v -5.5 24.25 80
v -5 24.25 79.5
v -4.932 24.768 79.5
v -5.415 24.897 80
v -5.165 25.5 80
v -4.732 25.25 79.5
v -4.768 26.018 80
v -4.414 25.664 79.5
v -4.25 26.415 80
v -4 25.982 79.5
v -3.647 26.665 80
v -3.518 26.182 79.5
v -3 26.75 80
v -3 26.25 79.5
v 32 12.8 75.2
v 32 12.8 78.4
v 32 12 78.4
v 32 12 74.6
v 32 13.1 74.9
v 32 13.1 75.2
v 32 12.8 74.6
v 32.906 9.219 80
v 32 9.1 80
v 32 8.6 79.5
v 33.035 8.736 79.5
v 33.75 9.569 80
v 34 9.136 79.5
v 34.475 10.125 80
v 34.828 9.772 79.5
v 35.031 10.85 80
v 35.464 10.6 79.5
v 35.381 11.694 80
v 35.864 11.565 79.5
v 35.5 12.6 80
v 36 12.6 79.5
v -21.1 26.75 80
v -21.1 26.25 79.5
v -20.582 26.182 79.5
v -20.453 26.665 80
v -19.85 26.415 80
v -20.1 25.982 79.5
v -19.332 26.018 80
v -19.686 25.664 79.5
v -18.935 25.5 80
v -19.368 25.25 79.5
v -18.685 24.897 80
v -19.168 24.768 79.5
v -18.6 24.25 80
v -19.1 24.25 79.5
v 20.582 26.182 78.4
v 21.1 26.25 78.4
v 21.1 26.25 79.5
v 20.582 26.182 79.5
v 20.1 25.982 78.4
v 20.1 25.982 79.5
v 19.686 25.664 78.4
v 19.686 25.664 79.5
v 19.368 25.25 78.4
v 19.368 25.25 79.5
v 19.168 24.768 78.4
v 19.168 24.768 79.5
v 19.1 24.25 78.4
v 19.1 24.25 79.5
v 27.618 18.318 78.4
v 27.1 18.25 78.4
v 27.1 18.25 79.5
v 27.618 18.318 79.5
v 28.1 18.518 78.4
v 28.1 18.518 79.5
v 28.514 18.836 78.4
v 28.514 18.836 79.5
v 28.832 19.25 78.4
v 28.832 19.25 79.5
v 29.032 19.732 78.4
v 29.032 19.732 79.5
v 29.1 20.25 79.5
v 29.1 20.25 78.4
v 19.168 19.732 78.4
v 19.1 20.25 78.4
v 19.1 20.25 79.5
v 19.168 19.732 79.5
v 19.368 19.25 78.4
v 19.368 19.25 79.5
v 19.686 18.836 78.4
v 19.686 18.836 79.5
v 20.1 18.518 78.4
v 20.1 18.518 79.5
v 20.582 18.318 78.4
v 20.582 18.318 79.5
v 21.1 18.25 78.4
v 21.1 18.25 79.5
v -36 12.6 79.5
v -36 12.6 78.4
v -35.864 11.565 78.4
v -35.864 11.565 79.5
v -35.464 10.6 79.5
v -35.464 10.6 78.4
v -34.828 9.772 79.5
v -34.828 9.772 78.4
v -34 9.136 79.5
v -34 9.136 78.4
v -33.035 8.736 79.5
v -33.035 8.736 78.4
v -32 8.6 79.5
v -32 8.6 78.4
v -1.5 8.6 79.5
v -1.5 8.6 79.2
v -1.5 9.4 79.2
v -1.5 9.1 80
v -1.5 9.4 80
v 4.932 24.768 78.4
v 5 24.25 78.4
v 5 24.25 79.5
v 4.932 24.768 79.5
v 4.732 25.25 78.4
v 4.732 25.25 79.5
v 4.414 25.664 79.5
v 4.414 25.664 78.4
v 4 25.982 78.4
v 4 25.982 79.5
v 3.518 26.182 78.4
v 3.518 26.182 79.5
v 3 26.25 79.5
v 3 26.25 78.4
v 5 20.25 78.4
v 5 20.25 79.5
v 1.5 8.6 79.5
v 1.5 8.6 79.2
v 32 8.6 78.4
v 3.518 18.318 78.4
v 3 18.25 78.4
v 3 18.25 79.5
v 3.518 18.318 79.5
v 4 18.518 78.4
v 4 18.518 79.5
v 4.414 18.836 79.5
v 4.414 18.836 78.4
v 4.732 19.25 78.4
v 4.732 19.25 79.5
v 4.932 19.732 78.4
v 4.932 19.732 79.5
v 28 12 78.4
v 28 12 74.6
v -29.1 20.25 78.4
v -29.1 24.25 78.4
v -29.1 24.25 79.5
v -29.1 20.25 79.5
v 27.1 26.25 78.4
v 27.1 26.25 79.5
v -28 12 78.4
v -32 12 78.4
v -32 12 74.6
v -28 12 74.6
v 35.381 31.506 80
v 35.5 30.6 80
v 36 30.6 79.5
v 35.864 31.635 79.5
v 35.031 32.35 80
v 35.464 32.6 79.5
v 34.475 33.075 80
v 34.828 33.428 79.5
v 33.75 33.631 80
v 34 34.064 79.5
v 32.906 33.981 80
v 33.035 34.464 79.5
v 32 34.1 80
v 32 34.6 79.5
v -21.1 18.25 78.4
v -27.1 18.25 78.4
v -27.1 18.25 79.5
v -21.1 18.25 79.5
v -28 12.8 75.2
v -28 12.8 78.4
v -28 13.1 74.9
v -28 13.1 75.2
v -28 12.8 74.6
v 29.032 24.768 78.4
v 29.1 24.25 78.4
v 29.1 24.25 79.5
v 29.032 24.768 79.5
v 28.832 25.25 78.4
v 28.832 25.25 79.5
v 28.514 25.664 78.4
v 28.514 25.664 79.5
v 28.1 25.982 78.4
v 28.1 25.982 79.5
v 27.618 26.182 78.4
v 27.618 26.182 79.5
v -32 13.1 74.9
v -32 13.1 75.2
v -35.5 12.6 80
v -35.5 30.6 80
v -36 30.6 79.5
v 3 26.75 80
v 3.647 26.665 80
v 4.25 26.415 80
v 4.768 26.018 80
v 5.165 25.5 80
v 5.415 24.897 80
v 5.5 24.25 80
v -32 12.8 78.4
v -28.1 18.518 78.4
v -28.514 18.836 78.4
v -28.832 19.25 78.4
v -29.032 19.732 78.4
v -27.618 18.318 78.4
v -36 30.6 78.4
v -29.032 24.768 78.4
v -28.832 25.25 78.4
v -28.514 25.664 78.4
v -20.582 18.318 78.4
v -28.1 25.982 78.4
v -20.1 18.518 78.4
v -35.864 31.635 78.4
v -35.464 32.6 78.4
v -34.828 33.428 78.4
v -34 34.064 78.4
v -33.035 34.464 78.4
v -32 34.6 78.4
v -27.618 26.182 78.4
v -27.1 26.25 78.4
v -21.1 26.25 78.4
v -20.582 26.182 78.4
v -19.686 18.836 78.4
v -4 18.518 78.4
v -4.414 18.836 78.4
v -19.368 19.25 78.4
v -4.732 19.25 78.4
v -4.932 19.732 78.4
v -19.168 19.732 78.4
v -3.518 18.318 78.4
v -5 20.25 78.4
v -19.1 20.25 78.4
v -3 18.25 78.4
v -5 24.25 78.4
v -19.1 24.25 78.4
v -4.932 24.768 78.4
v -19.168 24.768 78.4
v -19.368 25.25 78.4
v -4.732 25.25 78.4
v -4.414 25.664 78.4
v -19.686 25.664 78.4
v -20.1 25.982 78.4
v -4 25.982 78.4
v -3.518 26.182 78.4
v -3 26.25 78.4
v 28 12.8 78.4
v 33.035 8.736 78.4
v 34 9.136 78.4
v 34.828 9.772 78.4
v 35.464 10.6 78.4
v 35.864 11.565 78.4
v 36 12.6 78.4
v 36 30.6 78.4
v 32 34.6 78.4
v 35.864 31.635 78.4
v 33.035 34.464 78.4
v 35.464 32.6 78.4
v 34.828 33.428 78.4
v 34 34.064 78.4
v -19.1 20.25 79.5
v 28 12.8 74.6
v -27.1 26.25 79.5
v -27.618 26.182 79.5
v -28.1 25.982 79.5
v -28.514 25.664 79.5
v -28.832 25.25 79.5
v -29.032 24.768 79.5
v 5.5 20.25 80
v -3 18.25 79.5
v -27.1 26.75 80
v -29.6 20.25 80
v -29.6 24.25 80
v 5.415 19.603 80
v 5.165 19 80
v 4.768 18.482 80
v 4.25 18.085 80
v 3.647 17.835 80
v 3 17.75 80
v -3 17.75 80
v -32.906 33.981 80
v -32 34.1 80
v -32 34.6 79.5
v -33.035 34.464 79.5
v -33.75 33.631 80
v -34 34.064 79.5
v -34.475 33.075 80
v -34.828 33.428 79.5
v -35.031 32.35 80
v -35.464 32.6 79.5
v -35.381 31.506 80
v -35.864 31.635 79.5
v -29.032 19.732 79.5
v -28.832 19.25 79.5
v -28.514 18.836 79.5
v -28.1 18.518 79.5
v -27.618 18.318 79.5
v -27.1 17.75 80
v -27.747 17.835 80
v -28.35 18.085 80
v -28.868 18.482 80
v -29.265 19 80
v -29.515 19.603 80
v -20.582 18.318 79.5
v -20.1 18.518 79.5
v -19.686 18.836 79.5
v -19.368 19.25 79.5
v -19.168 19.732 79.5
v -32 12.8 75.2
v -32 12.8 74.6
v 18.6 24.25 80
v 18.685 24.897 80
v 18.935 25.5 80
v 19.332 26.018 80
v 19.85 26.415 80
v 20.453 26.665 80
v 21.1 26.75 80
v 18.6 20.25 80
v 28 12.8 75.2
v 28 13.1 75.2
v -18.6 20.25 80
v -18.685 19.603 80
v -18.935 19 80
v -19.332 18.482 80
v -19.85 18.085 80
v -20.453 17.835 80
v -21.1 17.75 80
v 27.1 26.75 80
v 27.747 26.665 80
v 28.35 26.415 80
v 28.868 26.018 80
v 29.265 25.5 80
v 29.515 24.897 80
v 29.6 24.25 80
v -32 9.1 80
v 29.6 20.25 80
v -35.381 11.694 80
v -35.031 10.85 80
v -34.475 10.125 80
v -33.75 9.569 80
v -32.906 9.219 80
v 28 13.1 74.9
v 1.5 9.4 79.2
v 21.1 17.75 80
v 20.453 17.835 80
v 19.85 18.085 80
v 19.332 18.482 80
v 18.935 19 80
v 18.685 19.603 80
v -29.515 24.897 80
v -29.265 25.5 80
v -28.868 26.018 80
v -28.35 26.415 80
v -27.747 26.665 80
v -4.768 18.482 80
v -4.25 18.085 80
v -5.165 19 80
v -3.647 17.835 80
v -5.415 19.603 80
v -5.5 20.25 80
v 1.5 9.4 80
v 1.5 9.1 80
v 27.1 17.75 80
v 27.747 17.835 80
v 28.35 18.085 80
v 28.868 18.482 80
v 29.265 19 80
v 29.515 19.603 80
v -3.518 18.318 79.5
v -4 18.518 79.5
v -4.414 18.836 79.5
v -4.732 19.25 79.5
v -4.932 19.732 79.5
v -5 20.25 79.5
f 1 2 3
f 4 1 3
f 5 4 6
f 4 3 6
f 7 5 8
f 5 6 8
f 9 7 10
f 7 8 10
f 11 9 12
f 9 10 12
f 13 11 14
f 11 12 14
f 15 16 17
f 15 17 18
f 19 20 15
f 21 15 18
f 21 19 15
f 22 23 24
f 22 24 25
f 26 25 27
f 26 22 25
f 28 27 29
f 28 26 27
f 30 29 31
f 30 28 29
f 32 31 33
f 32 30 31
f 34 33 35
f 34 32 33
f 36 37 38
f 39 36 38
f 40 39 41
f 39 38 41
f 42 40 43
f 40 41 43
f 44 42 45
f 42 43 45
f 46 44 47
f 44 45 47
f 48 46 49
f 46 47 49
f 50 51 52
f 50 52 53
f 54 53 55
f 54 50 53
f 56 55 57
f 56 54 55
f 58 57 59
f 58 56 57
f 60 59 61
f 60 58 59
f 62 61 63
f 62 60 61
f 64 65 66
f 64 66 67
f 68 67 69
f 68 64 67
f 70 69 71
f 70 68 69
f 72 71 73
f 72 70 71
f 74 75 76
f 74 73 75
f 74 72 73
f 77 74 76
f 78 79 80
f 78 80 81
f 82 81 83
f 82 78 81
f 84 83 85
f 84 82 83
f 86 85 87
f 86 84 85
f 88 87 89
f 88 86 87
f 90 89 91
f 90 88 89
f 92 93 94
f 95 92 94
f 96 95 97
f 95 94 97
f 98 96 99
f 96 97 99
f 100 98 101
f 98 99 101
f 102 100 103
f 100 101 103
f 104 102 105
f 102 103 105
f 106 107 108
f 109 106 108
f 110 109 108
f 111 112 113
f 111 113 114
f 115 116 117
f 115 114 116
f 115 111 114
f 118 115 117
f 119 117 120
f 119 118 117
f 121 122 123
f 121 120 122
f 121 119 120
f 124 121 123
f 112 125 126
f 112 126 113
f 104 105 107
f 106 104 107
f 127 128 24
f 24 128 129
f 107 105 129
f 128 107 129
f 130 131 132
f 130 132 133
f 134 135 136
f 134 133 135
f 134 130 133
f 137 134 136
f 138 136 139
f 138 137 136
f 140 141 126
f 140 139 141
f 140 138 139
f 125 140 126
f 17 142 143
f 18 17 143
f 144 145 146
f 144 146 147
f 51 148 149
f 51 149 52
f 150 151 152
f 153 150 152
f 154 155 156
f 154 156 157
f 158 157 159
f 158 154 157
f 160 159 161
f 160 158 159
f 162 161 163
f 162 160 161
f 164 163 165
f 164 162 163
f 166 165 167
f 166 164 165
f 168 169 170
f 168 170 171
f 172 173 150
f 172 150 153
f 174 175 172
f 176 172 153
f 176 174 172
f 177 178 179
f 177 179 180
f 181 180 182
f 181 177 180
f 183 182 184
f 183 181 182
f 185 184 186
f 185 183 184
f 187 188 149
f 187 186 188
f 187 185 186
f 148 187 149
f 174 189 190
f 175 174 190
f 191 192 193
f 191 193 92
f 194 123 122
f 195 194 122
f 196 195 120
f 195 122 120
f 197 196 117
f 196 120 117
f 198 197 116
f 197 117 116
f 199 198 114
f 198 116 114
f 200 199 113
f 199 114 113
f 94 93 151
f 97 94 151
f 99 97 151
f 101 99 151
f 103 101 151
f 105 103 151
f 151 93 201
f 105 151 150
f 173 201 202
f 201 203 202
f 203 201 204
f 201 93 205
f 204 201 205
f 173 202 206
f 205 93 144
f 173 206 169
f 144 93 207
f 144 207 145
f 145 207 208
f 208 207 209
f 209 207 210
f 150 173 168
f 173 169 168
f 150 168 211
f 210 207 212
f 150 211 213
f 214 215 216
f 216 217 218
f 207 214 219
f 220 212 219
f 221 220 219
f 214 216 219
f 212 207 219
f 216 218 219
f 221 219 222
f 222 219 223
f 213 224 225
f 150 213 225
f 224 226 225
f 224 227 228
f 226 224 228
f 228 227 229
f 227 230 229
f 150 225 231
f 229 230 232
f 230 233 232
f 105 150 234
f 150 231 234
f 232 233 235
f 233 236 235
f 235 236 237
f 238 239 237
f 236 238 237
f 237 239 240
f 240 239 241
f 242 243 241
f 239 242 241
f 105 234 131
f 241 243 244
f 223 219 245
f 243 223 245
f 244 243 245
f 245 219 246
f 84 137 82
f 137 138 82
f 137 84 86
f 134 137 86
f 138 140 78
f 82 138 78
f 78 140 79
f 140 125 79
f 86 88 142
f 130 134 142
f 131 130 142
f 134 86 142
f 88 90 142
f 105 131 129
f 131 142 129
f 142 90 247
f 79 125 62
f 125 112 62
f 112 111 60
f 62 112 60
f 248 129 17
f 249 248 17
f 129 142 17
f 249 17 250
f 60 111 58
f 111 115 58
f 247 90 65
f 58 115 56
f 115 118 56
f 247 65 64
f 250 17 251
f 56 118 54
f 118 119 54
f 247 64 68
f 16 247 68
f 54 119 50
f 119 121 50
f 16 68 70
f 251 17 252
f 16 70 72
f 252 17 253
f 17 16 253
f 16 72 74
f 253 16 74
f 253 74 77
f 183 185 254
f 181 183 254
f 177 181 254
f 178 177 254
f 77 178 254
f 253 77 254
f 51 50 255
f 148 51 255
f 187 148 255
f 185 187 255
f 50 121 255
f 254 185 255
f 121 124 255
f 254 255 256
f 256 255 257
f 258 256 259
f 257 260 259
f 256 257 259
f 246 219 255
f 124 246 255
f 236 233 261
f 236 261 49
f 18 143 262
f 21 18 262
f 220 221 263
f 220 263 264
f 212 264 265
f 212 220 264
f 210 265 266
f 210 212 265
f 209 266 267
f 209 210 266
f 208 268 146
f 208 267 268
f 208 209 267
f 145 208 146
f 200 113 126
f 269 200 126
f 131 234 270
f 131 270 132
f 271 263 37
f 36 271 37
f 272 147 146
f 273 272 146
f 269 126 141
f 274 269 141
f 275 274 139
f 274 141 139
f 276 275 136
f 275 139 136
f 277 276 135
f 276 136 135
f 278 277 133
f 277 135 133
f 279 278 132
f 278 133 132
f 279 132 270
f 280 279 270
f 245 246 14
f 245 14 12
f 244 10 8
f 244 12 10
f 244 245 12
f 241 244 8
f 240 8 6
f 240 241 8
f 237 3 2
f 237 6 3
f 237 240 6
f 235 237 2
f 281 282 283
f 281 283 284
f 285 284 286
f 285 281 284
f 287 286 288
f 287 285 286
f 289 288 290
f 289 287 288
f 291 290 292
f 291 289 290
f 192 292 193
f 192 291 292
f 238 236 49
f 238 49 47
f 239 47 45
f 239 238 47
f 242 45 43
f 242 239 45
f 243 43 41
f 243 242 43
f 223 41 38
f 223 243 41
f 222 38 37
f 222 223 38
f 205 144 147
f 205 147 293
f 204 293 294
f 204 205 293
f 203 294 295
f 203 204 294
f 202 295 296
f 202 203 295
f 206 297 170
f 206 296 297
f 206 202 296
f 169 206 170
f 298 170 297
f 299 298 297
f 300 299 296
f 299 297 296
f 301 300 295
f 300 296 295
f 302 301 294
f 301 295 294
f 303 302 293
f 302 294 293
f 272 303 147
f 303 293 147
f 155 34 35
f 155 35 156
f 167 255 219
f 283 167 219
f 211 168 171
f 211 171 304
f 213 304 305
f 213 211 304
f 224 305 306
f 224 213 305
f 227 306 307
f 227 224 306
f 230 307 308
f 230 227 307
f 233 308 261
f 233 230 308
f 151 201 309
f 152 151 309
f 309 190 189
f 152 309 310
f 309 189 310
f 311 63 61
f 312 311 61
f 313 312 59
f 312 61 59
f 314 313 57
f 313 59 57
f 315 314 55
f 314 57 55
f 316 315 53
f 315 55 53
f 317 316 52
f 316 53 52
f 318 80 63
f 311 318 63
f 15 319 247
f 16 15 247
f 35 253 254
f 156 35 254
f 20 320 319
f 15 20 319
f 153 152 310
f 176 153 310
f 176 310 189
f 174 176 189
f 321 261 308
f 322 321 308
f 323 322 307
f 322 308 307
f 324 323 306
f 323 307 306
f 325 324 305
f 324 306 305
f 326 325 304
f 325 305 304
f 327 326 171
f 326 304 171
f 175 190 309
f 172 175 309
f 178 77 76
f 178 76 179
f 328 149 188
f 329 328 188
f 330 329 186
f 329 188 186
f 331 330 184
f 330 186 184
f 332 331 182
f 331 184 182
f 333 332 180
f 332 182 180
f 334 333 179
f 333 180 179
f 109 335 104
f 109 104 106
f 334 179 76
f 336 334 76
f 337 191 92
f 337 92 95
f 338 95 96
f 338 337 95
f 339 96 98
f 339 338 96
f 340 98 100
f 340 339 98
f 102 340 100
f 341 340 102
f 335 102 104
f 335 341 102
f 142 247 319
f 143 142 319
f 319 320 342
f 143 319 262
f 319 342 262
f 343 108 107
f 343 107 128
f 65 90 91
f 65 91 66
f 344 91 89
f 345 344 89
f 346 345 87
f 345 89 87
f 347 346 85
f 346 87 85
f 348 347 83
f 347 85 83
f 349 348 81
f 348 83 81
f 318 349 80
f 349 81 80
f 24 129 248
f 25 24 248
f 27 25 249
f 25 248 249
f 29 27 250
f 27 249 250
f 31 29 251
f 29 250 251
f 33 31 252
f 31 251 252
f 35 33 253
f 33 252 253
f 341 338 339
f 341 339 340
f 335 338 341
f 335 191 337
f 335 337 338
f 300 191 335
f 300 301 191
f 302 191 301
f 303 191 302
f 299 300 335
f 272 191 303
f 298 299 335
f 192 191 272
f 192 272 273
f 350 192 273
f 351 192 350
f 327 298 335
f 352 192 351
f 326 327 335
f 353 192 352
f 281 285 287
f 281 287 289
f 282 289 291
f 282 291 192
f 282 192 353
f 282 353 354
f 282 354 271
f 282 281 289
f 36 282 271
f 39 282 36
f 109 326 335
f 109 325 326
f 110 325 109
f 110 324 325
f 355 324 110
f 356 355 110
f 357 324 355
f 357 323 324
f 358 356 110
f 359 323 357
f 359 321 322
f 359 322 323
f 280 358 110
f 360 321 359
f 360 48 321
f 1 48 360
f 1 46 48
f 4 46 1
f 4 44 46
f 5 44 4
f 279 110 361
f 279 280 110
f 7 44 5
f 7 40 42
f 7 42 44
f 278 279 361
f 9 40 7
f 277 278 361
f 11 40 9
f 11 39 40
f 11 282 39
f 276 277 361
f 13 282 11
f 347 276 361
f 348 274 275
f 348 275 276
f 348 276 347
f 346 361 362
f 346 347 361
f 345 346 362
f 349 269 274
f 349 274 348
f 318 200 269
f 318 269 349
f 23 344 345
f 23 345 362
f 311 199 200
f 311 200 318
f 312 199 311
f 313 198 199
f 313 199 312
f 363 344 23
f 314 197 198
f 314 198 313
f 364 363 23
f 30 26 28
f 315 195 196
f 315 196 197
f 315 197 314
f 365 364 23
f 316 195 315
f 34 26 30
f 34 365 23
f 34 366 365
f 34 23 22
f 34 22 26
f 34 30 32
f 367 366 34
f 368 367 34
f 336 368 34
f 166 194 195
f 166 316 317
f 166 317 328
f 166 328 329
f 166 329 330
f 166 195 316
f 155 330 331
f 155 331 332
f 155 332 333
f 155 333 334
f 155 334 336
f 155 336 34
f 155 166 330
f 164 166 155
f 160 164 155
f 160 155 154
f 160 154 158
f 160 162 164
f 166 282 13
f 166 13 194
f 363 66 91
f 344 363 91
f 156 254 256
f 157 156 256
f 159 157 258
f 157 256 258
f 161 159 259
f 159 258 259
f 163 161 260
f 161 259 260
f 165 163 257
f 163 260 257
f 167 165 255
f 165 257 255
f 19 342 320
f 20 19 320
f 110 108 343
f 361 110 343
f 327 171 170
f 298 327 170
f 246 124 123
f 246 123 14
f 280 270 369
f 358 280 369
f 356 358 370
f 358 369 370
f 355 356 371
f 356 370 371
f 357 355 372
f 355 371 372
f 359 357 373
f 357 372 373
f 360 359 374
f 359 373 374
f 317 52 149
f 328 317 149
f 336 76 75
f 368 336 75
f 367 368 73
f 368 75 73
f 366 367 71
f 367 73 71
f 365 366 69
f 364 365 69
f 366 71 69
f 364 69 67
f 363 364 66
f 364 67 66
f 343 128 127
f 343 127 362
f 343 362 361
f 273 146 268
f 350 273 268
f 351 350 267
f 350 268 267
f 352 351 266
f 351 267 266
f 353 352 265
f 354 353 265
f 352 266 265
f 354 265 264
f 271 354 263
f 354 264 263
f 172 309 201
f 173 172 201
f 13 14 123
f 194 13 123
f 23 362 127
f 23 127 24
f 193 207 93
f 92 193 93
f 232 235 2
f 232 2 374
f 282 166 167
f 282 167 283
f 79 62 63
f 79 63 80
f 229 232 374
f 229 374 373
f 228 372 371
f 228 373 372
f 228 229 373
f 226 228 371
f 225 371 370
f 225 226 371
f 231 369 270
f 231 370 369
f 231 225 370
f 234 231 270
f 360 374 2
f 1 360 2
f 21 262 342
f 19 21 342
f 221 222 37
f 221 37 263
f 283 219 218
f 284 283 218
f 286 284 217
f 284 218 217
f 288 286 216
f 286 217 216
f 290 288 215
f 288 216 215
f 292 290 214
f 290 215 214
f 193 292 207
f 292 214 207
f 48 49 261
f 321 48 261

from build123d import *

# Parameters (mm, degrees)
BOSS_EXTRUDE1_START = 78.4
BOSS_EXTRUDE1_DEPTH = 1.6
CHAMFER1_SIZE       = 0.5
BOSS_EXTRUDE2_START = 78
BOSS_EXTRUDE2_DEPTH = 3
CHAMFER2_SIZE       = 0.5
BOSS_EXTRUDE3_START = 78
BOSS_EXTRUDE3_DEPTH = 3
CHAMFER3_SIZE       = 0.5
BOSS_EXTRUDE4_START = 78
BOSS_EXTRUDE4_DEPTH = 3
CHAMFER4_SIZE       = 0.5
BOSS_EXTRUDE5_START = 79.2
SKETCH5_W           = 3
SKETCH5_H           = 0.9
BOSS_EXTRUDE5_DEPTH = 0.9
BOSS_EXTRUDE6_START = -32
BOSS_EXTRUDE6_DEPTH = 4
BOSS_EXTRUDE7_START = 28
BOSS_EXTRUDE7_DEPTH = 4


with BuildPart() as part:
    # Sketch1 → Boss-Extrude1 (new body)
    with BuildSketch(Plane.XY.offset(BOSS_EXTRUDE1_START)):
        with BuildLine():
            Line((-32, 8.6), (32, 8.6))
            ThreePointArc((32, 8.6), (34.828427125, 9.771572875), (36, 12.6))
            Line((36, 12.6), (36, 30.6))
            ThreePointArc((36, 30.6), (34.828427125, 33.428427125), (32, 34.6))
            Line((32, 34.6), (-32, 34.6))
            ThreePointArc((-32, 34.6), (-34.828427125, 33.428427125), (-36, 30.6))
            Line((-36, 30.6), (-36, 12.6))
            ThreePointArc((-36, 12.6), (-34.828427125, 9.771572875), (-32, 8.6))
        make_face()
    extrude(amount=BOSS_EXTRUDE1_DEPTH)

    # Chamfer1
    chamfer1_edges = [part.edges().sort_by_distance(p)[0] for p in [
        (34.828427125, 9.771572875, 80),
        (36, 21.6, 80),
        (34.828427125, 33.428427125, 80),
        (0, 34.6, 80),
        (-34.828427125, 33.428427125, 80),
        (-36, 21.6, 80),
        (-34.828427125, 9.771572875, 80),
        (0, 8.6, 80),
    ]]
    chamfer(chamfer1_edges, length=CHAMFER1_SIZE)


with BuildPart() as body_2:
    # Sketch2 → Boss-Extrude2 (new body)
    with BuildSketch(Plane.XY.offset(BOSS_EXTRUDE2_START)):
        with BuildLine():
            Line((-3, 18.25), (3, 18.25))
            ThreePointArc((3, 18.25), (4.414213562, 18.835786438), (5, 20.25))
            Line((5, 20.25), (5, 24.25))
            ThreePointArc((5, 24.25), (4.414213562, 25.664213562), (3, 26.25))
            Line((3, 26.25), (-3, 26.25))
            ThreePointArc((-3, 26.25), (-4.414213562, 25.664213562), (-5, 24.25))
            Line((-5, 24.25), (-5, 20.25))
            ThreePointArc((-5, 20.25), (-4.414213562, 18.835786438), (-3, 18.25))
        make_face()
    extrude(amount=BOSS_EXTRUDE2_DEPTH)


with BuildPart() as part_1:
    add(part.part)

    # Combine1: cut body 2
    add(body_2.part, mode=Mode.SUBTRACT)

    # Chamfer2
    chamfer2_edges = [part_1.edges().sort_by_distance(p)[0] for p in [
        (-4.414213562, 18.835786438, 80),
        (0, 18.25, 80),
        (4.414213562, 18.835786438, 80),
        (5, 22.25, 80),
        (4.414213562, 25.664213562, 80),
        (0, 26.25, 80),
        (-4.414213562, 25.664213562, 80),
        (-5, 22.25, 80),
    ]]
    chamfer(chamfer2_edges, length=CHAMFER2_SIZE)


with BuildPart() as body_2_2:
    # Sketch3 → Boss-Extrude3 (new body)
    with BuildSketch(Plane.XY.offset(BOSS_EXTRUDE3_START)):
        with BuildLine():
            Line((21.1, 18.25), (27.1, 18.25))
            ThreePointArc((27.1, 18.25), (28.514213562, 18.835786438), (29.1, 20.25))
            Line((29.1, 20.25), (29.1, 24.25))
            ThreePointArc((29.1, 24.25), (28.514213562, 25.664213562), (27.1, 26.25))
            Line((27.1, 26.25), (21.1, 26.25))
            ThreePointArc((21.1, 26.25), (19.685786438, 25.664213562), (19.1, 24.25))
            Line((19.1, 24.25), (19.1, 20.25))
            ThreePointArc((19.1, 20.25), (19.685786438, 18.835786438), (21.1, 18.25))
        make_face()
    extrude(amount=BOSS_EXTRUDE3_DEPTH)


with BuildPart() as part_2:
    add(part_1.part)

    # Combine2: cut body 2 2
    add(body_2_2.part, mode=Mode.SUBTRACT)

    # Chamfer3
    chamfer3_edges = [part_2.edges().sort_by_distance(p)[0] for p in [
        (19.685786438, 18.835786438, 80),
        (24.1, 18.25, 80),
        (28.514213562, 18.835786438, 80),
        (29.1, 22.25, 80),
        (28.514213562, 25.664213562, 80),
        (24.1, 26.25, 80),
        (19.685786438, 25.664213562, 80),
        (19.1, 22.25, 80),
    ]]
    chamfer(chamfer3_edges, length=CHAMFER3_SIZE)


with BuildPart() as body_2_3:
    # Sketch4 → Boss-Extrude4 (new body)
    with BuildSketch(Plane.XY.offset(BOSS_EXTRUDE4_START)):
        with BuildLine():
            Line((-27.1, 18.25), (-21.1, 18.25))
            ThreePointArc((-21.1, 18.25), (-19.685786438, 18.835786438), (-19.1, 20.25))
            Line((-19.1, 20.25), (-19.1, 24.25))
            ThreePointArc((-19.1, 24.25), (-19.685786438, 25.664213562), (-21.1, 26.25))
            Line((-21.1, 26.25), (-27.1, 26.25))
            ThreePointArc((-27.1, 26.25), (-28.514213562, 25.664213562), (-29.1, 24.25))
            Line((-29.1, 24.25), (-29.1, 20.25))
            ThreePointArc((-29.1, 20.25), (-28.514213562, 18.835786438), (-27.1, 18.25))
        make_face()
    extrude(amount=BOSS_EXTRUDE4_DEPTH)


with BuildPart() as part_3:
    add(part_2.part)

    # Combine3: cut body 2 3
    add(body_2_3.part, mode=Mode.SUBTRACT)

    # Chamfer4
    chamfer4_edges = [part_3.edges().sort_by_distance(p)[0] for p in [
        (-28.514213562, 18.835786438, 80),
        (-24.1, 18.25, 80),
        (-19.685786438, 18.835786438, 80),
        (-19.1, 22.25, 80),
        (-19.685786438, 25.664213562, 80),
        (-24.1, 26.25, 80),
        (-28.514213562, 25.664213562, 80),
        (-29.1, 22.25, 80),
    ]]
    chamfer(chamfer4_edges, length=CHAMFER4_SIZE)


with BuildPart() as body_2_4:
    # Sketch5 → Boss-Extrude5 (new body)
    with BuildSketch(Plane.XY.offset(BOSS_EXTRUDE5_START)):
        with Locations((0, 8.95)):
            Rectangle(SKETCH5_W, SKETCH5_H)
    extrude(amount=BOSS_EXTRUDE5_DEPTH)


with BuildPart() as part_4:
    add(part_3.part)

    # Combine4: cut body 2 4
    add(body_2_4.part, mode=Mode.SUBTRACT)

    # Sketch6 → Boss-Extrude6 (add)
    with BuildSketch(Plane(origin=(0, 0, 0), x_dir=(0, 0, -1), z_dir=(1, 0, 0)).offset(BOSS_EXTRUDE6_START)):
        Polygon((-78.41, 12), (-74.6, 12), (-74.6, 12.8), (-74.9, 13.1), (-75.2, 13.1), (-75.2, 12.8), (-78.41, 12.8), align=None)
    extrude(amount=BOSS_EXTRUDE6_DEPTH)

    # Sketch7 → Boss-Extrude7 (add)
    with BuildSketch(Plane(origin=(0, 0, 0), x_dir=(0, 0, -1), z_dir=(1, 0, 0)).offset(BOSS_EXTRUDE7_START)):
        Polygon((-78.41, 12), (-74.6, 12), (-74.6, 12.8), (-74.9, 13.1), (-75.2, 13.1), (-75.2, 12.8), (-78.41, 12.8), align=None)
    extrude(amount=BOSS_EXTRUDE7_DEPTH)


solid = part_4.part
